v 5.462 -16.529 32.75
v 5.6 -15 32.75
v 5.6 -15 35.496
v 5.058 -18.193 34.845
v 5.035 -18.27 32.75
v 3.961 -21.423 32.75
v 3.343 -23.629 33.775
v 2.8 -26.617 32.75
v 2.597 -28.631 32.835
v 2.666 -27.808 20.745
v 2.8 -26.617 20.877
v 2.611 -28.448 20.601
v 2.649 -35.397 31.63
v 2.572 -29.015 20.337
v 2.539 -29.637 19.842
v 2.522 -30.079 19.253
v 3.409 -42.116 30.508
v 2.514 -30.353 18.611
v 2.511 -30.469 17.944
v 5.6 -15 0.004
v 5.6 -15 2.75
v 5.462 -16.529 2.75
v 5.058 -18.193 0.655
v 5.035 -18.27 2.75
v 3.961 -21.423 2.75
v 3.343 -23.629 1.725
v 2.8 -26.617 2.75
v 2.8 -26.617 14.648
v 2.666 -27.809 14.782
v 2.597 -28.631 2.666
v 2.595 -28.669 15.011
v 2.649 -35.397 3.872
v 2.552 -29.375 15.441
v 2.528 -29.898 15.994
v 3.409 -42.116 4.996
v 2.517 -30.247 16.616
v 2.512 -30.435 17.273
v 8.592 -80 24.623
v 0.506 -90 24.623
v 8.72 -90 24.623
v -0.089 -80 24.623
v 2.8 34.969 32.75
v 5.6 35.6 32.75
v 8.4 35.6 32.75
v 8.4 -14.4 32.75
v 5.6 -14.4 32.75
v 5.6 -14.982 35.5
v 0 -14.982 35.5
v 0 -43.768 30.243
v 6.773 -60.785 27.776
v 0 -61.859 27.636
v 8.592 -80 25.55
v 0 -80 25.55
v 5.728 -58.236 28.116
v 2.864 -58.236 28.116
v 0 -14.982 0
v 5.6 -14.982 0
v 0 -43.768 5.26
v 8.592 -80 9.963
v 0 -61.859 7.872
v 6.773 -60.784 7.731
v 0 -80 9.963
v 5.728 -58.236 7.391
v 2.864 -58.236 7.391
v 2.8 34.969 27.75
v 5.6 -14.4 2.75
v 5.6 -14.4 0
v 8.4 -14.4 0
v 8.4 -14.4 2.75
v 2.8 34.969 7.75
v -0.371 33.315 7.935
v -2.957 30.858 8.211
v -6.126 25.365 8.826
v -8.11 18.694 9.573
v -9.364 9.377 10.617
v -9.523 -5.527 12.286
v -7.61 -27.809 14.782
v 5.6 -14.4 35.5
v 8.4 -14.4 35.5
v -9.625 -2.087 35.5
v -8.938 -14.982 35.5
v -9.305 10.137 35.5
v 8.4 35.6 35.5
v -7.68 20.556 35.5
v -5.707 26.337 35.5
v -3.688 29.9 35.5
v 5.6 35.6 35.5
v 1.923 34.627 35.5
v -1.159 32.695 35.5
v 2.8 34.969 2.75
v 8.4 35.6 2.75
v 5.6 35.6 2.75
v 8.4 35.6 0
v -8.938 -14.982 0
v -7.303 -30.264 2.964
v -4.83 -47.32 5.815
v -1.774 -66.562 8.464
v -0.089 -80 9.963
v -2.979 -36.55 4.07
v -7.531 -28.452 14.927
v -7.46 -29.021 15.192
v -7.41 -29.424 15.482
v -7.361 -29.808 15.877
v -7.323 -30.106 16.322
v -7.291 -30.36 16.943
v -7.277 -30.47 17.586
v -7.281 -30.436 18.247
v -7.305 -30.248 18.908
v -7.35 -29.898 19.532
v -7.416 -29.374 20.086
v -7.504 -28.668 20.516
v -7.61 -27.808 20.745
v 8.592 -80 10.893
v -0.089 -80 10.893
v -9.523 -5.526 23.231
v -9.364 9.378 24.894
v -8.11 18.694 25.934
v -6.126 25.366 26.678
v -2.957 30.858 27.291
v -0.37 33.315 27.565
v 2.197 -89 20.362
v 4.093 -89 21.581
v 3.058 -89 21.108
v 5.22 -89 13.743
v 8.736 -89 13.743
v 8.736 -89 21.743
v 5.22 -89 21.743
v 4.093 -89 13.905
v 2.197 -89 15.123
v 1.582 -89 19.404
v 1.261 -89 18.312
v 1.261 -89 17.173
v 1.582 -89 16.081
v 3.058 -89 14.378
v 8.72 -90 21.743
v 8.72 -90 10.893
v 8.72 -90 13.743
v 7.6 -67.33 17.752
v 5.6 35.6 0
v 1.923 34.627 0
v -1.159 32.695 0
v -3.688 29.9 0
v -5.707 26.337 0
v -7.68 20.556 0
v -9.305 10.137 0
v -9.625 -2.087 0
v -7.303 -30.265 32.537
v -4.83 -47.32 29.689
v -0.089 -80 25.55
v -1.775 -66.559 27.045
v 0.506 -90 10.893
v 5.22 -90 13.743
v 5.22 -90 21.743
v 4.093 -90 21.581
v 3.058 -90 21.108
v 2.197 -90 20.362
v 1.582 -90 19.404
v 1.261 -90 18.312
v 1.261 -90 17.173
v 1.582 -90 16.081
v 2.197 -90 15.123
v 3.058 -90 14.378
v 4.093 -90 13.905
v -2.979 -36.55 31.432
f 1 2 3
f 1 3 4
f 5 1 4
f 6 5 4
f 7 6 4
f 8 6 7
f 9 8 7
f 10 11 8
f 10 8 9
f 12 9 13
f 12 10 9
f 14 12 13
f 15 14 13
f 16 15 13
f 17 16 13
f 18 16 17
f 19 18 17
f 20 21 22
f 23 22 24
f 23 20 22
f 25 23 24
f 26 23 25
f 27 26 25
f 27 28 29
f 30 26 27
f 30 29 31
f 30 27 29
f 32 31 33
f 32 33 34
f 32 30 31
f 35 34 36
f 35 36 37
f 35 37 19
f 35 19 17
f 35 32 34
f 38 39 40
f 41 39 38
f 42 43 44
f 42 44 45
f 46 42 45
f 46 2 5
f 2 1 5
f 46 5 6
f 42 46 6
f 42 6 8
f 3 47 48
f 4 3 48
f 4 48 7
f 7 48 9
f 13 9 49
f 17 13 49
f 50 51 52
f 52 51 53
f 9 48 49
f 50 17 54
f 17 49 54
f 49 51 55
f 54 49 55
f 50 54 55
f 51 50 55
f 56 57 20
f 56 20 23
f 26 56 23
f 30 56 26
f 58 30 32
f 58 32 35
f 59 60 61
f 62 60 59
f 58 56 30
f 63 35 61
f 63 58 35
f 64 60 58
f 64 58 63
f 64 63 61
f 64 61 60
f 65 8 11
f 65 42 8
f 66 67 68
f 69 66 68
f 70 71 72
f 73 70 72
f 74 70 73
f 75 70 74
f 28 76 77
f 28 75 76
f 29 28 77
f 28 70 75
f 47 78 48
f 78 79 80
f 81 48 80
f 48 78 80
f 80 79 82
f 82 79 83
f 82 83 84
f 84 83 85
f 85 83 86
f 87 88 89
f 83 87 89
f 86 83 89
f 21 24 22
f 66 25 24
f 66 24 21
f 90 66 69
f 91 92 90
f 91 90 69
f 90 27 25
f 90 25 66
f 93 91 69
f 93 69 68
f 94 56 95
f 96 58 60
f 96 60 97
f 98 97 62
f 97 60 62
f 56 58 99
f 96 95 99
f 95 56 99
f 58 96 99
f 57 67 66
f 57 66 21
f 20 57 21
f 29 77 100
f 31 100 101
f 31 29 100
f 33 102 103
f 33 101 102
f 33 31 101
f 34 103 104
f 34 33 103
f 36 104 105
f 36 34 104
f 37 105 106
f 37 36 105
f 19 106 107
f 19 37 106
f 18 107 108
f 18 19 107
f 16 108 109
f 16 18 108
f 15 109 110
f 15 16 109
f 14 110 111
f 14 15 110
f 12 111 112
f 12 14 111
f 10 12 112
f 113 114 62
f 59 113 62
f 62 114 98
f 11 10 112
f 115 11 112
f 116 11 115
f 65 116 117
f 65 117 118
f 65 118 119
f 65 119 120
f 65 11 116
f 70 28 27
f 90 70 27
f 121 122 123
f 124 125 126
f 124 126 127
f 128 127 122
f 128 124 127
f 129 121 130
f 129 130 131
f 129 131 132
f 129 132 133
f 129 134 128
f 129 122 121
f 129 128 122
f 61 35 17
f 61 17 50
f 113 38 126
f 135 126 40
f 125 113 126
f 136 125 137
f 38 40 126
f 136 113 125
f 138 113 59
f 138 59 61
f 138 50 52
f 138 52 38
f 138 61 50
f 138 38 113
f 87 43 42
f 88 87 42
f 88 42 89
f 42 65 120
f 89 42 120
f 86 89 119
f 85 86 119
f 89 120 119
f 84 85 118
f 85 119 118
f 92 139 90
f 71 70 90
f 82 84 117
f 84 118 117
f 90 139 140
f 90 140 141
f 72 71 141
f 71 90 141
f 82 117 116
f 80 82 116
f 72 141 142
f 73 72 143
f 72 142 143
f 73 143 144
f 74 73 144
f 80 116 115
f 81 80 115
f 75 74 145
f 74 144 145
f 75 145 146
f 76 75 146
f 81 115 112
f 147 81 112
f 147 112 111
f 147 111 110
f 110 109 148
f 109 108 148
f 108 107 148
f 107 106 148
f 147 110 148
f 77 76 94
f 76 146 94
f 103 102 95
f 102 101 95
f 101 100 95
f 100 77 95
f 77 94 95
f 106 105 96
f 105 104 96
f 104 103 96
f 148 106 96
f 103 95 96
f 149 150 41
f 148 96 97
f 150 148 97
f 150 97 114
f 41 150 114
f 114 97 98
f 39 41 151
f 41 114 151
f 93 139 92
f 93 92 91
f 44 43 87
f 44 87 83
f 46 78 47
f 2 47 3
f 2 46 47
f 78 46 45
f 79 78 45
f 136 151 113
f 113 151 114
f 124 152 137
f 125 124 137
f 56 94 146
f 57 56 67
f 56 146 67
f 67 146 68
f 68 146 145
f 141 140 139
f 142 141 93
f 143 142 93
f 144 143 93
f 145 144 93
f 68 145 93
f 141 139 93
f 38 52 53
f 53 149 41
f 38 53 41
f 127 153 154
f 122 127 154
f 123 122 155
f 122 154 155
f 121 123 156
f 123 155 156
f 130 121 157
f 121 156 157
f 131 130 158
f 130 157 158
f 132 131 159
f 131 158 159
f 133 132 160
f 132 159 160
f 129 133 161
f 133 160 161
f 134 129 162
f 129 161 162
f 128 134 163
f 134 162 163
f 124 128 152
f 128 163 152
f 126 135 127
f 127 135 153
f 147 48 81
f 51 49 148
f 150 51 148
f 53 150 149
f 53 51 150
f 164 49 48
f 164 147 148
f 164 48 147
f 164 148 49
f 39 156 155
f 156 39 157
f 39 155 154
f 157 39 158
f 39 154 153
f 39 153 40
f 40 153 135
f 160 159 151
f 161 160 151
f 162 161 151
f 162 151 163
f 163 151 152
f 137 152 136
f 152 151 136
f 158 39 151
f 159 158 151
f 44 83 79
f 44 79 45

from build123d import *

# Parameters (mm, degrees)
BOSS_EXTRUDE2_DEPTH     = 35.5
CUT_EXTRUDE1_DEPTH      = 17.75
CUT_EXTRUDE2_DEPTH      = 2.8
SKETCH5_W               = 2.8
SKETCH5_H               = 2.75
BOSS_EXTRUDE3_DEPTH     = 50
CUT_EXTRUDE3_DEPTH      = 15
CUT_EXTRUDE4_DEPTH      = 126.902937834
CUT_EXTRUDE4_DEPTH_BACK = 126.902937834
SKETCH12_W              = 1.496855304
SKETCH12_H              = 10
SKETCH12_W_2            = 1.571931937
CUT_EXTRUDE5_DEPTH      = 20
CUT_EXTRUDE6_DEPTH      = 1


with BuildPart() as part:
    # Sketch1 → Boss-Extrude2 (new body)
    with BuildSketch(Plane.XY):
        with BuildLine():
            Line((5.6, 35.6), (5.6, -15))
            add(Edge.make_bspline(
                [(5.6, -15), (5.6, -17.274393969), (1.604195195, -25.847964508), (2.415841027, -35.113621235), (3.409417942, -42.11611418)],
                knots=[0, 0, 0, 0, 0.227789152, 0.921500182, 0.921500182, 0.921500182, 0.921500182], degree=3))
            add(Edge.make_bspline(
                [(3.409417942, -42.11611418), (14.021423643, -91.198515752), (3.540705721, -122.805120936)],
                knots=[0, 0, 0, 1, 1, 1], degree=2))
            Line((3.540705721, -122.805120936), (-4.088116427, -120.408076375))
            add(Edge.make_bspline(
                [(5.6, 35.6), (-12.367874994, 33.521263174), (-8.7823866, -50.782642202), (5.954211422, -91.451497422), (-4.088116427, -120.408076375)],
                knots=[0, 0, 0, 0, 0.40530679, 1, 1, 1, 1], degree=3))
        make_face()
    extrude(amount=BOSS_EXTRUDE2_DEPTH)

    # Sketch3 → Cut-Extrude1 (cut, symmetric)
    with BuildSketch(Plane(origin=(0, 0, 0), x_dir=(0, 0, -1), z_dir=(1, 0, 0))):
        with BuildLine():
            Line((0, -14.98237842), (29.62736343, -14.98237842))
            Line((29.62736343, -14.98237842), (29.62736343, -131.572481325))
            Line((29.62736343, -131.572481325), (-60.547074518, -131.572481325))
            Line((-60.547074518, -131.572481325), (-60.547074518, -14.98237842))
            Line((-60.547074518, -14.98237842), (-35.5, -14.98237842))
            add(Edge.make_bspline(
                [(-35.5, -14.98237842), (-28.308780975, -49.75857776), (-24.077993602, -85.166412163), (-22.769212626, -120.408076375)],
                knots=[0, 0, 0, 0, 1, 1, 1, 1], degree=3))
            Line((-22.769212626, -120.408076375), (-12.75, -120.408076375))
            add(Edge.make_bspline(
                [(0, -14.98237842), (-7.191219025, -49.75857776), (-11.441219025, -85.166412163), (-12.75, -120.408076375)],
                knots=[0, 0, 0, 0, 1, 1, 1, 1], degree=3))
        make_face()
    extrude(amount=CUT_EXTRUDE1_DEPTH, both=True, mode=Mode.SUBTRACT)

    # Sketch4 → Cut-Extrude2 (cut)
    with BuildSketch(Plane(origin=(5.6, 0, 0), x_dir=(0, 0, -1), z_dir=(1, 0, 0))):
        Polygon((-2.75, 35.6), (-32.75, 35.6), (-32.75, -15.000000007), (-32.75, -32.018147114), (-2.75, -32.018147114), (-2.75, -15.000000007), align=None)
    extrude(amount=-CUT_EXTRUDE2_DEPTH, mode=Mode.SUBTRACT)

    # Sketch5 → Boss-Extrude3 (add)
    with BuildSketch(Plane(origin=(0, 35.6, 0), x_dir=(1, 0, 0), z_dir=(0, 1, 0))):
        with Locations((7, -1.375)):
            Rectangle(SKETCH5_W, SKETCH5_H)
        with Locations((7, -34.125)):
            Rectangle(SKETCH5_W, SKETCH5_H)
    extrude(amount=-BOSS_EXTRUDE3_DEPTH)

    # Sketch6 → Cut-Extrude3 (cut, symmetric)
    with BuildSketch(Plane(origin=(0, 0, 0), x_dir=(0, 0, -1), z_dir=(1, 0, 0))):
        with BuildLine():
            Line((-7.75, 34.96933844), (-14.781773193, -27.808788024))
            ThreePointArc((-14.781773193, -27.808788024), (-17.763748777, -30.474846509), (-20.744622729, -27.807556366))
            Line((-20.744622729, -27.807556366), (-27.75, 34.96933844))
            Line((-27.75, 34.96933844), (-7.75, 34.96933844))
        make_face()
    extrude(amount=CUT_EXTRUDE3_DEPTH, both=True, mode=Mode.SUBTRACT)

    # Sketch12 → Cut-Extrude4 (cut, two sides: drawn at the far end of the back side and taken through both)
    with BuildSketch(Plane(origin=(0, 0, 0), x_dir=(0, 0, -1), z_dir=(1, 0, 0)).offset(-CUT_EXTRUDE4_DEPTH_BACK)):
        with Locations((-10.144277768, -85)):
            Rectangle(SKETCH12_W, SKETCH12_H)
        with Locations((-25.408624424, -85)):
            Rectangle(SKETCH12_W_2, SKETCH12_H)
    extrude(amount=CUT_EXTRUDE4_DEPTH + CUT_EXTRUDE4_DEPTH_BACK, mode=Mode.SUBTRACT)

    # Sketch14 → Cut-Extrude5 (cut)
    with BuildSketch(Plane(origin=(0, 0, 10.89270542), x_dir=(-1, 0, 0), z_dir=(0, 0, -1))):
        Polygon((-8.720315384, -90), (6.272671273, -90), (6.272671273, -124.093634091), (-10.541100015, -124.093634091), (-10.541100015, -90), align=None)
    extrude(amount=-CUT_EXTRUDE5_DEPTH, mode=Mode.SUBTRACT)

    # Sketch15 → Cut-Extrude6 (cut)
    with BuildSketch(Plane(origin=(0, -90, 0), x_dir=(-1, 0, 0), z_dir=(0, -1, 0))):
        with BuildLine():
            Line((-5.220315384, -13.74270542), (-8.720315384, -13.74270542))
            Line((-8.720315384, -13.74270542), (-9.623354914, -13.74270542))
            Line((-9.623354914, -13.74270542), (-9.623354914, -21.74270542))
            Line((-9.623354914, -21.74270542), (-5.220315384, -21.74270542))
            ThreePointArc((-5.220315384, -21.74270542), (-1.220315384, -17.74270542), (-5.220315384, -13.74270542))
        make_face()
    extrude(amount=-CUT_EXTRUDE6_DEPTH, mode=Mode.SUBTRACT)


solid = part.part
